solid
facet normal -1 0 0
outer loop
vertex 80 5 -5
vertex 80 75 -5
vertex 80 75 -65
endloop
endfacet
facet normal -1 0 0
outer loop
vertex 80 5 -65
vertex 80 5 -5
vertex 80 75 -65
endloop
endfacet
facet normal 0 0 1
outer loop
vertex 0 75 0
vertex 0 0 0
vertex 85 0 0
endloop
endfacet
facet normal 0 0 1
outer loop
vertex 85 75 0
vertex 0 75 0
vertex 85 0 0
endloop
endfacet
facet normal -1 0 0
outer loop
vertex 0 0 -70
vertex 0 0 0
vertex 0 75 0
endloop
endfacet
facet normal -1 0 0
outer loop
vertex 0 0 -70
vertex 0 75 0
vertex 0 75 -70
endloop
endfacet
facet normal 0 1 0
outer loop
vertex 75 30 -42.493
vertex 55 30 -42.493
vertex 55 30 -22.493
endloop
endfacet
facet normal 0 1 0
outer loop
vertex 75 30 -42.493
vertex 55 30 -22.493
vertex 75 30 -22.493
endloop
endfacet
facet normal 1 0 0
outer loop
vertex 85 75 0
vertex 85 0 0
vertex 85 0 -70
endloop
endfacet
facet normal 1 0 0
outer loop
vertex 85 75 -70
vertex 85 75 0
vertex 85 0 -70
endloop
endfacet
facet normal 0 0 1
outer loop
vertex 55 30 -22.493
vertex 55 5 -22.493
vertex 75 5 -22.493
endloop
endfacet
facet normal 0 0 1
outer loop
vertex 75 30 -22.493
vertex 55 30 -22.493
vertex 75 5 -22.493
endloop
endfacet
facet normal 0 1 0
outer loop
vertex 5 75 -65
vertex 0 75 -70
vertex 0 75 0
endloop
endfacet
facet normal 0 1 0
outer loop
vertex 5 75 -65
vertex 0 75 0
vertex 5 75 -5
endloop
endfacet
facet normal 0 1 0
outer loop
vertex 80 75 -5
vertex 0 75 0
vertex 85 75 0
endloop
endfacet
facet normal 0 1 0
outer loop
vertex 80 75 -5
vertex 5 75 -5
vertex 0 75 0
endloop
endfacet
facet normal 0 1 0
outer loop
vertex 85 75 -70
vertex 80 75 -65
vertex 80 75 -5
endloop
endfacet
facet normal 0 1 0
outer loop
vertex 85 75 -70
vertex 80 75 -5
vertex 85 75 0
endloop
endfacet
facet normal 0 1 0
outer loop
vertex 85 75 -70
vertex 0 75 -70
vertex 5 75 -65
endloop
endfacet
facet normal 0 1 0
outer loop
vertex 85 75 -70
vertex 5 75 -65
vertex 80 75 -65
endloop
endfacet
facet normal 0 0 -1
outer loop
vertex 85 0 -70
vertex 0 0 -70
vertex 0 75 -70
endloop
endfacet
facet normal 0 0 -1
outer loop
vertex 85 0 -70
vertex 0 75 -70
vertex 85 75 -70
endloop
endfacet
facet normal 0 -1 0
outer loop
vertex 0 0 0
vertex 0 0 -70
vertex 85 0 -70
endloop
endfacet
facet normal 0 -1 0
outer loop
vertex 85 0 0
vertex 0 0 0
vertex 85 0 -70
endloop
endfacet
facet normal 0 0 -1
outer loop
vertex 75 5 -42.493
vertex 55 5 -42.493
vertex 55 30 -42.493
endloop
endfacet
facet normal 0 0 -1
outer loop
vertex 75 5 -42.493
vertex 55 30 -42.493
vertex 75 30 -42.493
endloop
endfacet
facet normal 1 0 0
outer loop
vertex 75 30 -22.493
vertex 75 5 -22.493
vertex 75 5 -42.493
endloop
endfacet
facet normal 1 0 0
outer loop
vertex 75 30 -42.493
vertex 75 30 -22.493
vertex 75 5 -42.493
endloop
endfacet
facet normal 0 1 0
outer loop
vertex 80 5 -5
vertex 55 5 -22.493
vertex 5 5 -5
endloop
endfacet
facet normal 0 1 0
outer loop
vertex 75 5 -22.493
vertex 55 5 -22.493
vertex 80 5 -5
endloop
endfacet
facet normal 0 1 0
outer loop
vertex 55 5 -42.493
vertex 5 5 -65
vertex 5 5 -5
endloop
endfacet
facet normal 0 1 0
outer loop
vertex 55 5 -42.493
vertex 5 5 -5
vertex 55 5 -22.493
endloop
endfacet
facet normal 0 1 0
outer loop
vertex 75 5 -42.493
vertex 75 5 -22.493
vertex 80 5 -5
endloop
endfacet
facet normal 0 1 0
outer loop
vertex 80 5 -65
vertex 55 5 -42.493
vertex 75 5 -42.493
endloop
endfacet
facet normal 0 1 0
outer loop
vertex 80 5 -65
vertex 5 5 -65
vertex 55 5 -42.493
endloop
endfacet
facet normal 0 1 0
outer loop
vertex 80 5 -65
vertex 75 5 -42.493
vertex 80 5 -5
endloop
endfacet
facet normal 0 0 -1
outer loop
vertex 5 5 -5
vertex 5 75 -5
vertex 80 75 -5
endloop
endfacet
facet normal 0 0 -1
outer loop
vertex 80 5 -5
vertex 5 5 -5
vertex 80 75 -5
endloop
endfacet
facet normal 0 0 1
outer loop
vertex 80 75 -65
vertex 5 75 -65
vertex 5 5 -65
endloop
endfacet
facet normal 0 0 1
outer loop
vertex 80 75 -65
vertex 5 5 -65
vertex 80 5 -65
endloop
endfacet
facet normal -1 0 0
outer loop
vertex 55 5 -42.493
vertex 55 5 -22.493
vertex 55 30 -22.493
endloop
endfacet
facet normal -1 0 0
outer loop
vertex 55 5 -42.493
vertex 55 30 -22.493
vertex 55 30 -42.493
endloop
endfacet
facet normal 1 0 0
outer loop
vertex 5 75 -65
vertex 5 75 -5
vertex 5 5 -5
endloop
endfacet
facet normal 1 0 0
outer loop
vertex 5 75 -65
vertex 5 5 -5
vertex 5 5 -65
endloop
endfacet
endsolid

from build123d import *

# Parameters (mm, degrees)
SKETCH1_W           = 85
SKETCH1_H           = 70
BOSS_EXTRUDE1_DEPTH = 75
SKETCH2_W           = 75
SKETCH2_H           = 60
CUT_EXTRUDE1_DEPTH  = 70
SKETCH3_W           = 20
SKETCH3_H           = 20
BOSS_EXTRUDE2_DEPTH = 25


with BuildPart() as part:
    # Sketch1 → Boss-Extrude1 (new body)
    with BuildSketch(Plane(origin=(0, 0, 0), x_dir=(1, 0, 0), z_dir=(0, 1, 0))):
        with Locations((42.5, 35)):
            Rectangle(SKETCH1_W, SKETCH1_H)
    extrude(amount=BOSS_EXTRUDE1_DEPTH)

    # Sketch2 → Cut-Extrude1 (cut)
    with BuildSketch(Plane(origin=(0, 75, 0), x_dir=(1, 0, 0), z_dir=(0, 1, 0))):
        with Locations((42.5, 35)):
            Rectangle(SKETCH2_W, SKETCH2_H)
    extrude(amount=-CUT_EXTRUDE1_DEPTH, mode=Mode.SUBTRACT)

    # Sketch3 → Boss-Extrude2 (add)
    with BuildSketch(Plane(origin=(0, 5, 0), x_dir=(1, 0, 0), z_dir=(0, 1, 0))):
        with Locations((65, 32.492591032)):
            Rectangle(SKETCH3_W, SKETCH3_H)
    extrude(amount=BOSS_EXTRUDE2_DEPTH)


solid = part.part
